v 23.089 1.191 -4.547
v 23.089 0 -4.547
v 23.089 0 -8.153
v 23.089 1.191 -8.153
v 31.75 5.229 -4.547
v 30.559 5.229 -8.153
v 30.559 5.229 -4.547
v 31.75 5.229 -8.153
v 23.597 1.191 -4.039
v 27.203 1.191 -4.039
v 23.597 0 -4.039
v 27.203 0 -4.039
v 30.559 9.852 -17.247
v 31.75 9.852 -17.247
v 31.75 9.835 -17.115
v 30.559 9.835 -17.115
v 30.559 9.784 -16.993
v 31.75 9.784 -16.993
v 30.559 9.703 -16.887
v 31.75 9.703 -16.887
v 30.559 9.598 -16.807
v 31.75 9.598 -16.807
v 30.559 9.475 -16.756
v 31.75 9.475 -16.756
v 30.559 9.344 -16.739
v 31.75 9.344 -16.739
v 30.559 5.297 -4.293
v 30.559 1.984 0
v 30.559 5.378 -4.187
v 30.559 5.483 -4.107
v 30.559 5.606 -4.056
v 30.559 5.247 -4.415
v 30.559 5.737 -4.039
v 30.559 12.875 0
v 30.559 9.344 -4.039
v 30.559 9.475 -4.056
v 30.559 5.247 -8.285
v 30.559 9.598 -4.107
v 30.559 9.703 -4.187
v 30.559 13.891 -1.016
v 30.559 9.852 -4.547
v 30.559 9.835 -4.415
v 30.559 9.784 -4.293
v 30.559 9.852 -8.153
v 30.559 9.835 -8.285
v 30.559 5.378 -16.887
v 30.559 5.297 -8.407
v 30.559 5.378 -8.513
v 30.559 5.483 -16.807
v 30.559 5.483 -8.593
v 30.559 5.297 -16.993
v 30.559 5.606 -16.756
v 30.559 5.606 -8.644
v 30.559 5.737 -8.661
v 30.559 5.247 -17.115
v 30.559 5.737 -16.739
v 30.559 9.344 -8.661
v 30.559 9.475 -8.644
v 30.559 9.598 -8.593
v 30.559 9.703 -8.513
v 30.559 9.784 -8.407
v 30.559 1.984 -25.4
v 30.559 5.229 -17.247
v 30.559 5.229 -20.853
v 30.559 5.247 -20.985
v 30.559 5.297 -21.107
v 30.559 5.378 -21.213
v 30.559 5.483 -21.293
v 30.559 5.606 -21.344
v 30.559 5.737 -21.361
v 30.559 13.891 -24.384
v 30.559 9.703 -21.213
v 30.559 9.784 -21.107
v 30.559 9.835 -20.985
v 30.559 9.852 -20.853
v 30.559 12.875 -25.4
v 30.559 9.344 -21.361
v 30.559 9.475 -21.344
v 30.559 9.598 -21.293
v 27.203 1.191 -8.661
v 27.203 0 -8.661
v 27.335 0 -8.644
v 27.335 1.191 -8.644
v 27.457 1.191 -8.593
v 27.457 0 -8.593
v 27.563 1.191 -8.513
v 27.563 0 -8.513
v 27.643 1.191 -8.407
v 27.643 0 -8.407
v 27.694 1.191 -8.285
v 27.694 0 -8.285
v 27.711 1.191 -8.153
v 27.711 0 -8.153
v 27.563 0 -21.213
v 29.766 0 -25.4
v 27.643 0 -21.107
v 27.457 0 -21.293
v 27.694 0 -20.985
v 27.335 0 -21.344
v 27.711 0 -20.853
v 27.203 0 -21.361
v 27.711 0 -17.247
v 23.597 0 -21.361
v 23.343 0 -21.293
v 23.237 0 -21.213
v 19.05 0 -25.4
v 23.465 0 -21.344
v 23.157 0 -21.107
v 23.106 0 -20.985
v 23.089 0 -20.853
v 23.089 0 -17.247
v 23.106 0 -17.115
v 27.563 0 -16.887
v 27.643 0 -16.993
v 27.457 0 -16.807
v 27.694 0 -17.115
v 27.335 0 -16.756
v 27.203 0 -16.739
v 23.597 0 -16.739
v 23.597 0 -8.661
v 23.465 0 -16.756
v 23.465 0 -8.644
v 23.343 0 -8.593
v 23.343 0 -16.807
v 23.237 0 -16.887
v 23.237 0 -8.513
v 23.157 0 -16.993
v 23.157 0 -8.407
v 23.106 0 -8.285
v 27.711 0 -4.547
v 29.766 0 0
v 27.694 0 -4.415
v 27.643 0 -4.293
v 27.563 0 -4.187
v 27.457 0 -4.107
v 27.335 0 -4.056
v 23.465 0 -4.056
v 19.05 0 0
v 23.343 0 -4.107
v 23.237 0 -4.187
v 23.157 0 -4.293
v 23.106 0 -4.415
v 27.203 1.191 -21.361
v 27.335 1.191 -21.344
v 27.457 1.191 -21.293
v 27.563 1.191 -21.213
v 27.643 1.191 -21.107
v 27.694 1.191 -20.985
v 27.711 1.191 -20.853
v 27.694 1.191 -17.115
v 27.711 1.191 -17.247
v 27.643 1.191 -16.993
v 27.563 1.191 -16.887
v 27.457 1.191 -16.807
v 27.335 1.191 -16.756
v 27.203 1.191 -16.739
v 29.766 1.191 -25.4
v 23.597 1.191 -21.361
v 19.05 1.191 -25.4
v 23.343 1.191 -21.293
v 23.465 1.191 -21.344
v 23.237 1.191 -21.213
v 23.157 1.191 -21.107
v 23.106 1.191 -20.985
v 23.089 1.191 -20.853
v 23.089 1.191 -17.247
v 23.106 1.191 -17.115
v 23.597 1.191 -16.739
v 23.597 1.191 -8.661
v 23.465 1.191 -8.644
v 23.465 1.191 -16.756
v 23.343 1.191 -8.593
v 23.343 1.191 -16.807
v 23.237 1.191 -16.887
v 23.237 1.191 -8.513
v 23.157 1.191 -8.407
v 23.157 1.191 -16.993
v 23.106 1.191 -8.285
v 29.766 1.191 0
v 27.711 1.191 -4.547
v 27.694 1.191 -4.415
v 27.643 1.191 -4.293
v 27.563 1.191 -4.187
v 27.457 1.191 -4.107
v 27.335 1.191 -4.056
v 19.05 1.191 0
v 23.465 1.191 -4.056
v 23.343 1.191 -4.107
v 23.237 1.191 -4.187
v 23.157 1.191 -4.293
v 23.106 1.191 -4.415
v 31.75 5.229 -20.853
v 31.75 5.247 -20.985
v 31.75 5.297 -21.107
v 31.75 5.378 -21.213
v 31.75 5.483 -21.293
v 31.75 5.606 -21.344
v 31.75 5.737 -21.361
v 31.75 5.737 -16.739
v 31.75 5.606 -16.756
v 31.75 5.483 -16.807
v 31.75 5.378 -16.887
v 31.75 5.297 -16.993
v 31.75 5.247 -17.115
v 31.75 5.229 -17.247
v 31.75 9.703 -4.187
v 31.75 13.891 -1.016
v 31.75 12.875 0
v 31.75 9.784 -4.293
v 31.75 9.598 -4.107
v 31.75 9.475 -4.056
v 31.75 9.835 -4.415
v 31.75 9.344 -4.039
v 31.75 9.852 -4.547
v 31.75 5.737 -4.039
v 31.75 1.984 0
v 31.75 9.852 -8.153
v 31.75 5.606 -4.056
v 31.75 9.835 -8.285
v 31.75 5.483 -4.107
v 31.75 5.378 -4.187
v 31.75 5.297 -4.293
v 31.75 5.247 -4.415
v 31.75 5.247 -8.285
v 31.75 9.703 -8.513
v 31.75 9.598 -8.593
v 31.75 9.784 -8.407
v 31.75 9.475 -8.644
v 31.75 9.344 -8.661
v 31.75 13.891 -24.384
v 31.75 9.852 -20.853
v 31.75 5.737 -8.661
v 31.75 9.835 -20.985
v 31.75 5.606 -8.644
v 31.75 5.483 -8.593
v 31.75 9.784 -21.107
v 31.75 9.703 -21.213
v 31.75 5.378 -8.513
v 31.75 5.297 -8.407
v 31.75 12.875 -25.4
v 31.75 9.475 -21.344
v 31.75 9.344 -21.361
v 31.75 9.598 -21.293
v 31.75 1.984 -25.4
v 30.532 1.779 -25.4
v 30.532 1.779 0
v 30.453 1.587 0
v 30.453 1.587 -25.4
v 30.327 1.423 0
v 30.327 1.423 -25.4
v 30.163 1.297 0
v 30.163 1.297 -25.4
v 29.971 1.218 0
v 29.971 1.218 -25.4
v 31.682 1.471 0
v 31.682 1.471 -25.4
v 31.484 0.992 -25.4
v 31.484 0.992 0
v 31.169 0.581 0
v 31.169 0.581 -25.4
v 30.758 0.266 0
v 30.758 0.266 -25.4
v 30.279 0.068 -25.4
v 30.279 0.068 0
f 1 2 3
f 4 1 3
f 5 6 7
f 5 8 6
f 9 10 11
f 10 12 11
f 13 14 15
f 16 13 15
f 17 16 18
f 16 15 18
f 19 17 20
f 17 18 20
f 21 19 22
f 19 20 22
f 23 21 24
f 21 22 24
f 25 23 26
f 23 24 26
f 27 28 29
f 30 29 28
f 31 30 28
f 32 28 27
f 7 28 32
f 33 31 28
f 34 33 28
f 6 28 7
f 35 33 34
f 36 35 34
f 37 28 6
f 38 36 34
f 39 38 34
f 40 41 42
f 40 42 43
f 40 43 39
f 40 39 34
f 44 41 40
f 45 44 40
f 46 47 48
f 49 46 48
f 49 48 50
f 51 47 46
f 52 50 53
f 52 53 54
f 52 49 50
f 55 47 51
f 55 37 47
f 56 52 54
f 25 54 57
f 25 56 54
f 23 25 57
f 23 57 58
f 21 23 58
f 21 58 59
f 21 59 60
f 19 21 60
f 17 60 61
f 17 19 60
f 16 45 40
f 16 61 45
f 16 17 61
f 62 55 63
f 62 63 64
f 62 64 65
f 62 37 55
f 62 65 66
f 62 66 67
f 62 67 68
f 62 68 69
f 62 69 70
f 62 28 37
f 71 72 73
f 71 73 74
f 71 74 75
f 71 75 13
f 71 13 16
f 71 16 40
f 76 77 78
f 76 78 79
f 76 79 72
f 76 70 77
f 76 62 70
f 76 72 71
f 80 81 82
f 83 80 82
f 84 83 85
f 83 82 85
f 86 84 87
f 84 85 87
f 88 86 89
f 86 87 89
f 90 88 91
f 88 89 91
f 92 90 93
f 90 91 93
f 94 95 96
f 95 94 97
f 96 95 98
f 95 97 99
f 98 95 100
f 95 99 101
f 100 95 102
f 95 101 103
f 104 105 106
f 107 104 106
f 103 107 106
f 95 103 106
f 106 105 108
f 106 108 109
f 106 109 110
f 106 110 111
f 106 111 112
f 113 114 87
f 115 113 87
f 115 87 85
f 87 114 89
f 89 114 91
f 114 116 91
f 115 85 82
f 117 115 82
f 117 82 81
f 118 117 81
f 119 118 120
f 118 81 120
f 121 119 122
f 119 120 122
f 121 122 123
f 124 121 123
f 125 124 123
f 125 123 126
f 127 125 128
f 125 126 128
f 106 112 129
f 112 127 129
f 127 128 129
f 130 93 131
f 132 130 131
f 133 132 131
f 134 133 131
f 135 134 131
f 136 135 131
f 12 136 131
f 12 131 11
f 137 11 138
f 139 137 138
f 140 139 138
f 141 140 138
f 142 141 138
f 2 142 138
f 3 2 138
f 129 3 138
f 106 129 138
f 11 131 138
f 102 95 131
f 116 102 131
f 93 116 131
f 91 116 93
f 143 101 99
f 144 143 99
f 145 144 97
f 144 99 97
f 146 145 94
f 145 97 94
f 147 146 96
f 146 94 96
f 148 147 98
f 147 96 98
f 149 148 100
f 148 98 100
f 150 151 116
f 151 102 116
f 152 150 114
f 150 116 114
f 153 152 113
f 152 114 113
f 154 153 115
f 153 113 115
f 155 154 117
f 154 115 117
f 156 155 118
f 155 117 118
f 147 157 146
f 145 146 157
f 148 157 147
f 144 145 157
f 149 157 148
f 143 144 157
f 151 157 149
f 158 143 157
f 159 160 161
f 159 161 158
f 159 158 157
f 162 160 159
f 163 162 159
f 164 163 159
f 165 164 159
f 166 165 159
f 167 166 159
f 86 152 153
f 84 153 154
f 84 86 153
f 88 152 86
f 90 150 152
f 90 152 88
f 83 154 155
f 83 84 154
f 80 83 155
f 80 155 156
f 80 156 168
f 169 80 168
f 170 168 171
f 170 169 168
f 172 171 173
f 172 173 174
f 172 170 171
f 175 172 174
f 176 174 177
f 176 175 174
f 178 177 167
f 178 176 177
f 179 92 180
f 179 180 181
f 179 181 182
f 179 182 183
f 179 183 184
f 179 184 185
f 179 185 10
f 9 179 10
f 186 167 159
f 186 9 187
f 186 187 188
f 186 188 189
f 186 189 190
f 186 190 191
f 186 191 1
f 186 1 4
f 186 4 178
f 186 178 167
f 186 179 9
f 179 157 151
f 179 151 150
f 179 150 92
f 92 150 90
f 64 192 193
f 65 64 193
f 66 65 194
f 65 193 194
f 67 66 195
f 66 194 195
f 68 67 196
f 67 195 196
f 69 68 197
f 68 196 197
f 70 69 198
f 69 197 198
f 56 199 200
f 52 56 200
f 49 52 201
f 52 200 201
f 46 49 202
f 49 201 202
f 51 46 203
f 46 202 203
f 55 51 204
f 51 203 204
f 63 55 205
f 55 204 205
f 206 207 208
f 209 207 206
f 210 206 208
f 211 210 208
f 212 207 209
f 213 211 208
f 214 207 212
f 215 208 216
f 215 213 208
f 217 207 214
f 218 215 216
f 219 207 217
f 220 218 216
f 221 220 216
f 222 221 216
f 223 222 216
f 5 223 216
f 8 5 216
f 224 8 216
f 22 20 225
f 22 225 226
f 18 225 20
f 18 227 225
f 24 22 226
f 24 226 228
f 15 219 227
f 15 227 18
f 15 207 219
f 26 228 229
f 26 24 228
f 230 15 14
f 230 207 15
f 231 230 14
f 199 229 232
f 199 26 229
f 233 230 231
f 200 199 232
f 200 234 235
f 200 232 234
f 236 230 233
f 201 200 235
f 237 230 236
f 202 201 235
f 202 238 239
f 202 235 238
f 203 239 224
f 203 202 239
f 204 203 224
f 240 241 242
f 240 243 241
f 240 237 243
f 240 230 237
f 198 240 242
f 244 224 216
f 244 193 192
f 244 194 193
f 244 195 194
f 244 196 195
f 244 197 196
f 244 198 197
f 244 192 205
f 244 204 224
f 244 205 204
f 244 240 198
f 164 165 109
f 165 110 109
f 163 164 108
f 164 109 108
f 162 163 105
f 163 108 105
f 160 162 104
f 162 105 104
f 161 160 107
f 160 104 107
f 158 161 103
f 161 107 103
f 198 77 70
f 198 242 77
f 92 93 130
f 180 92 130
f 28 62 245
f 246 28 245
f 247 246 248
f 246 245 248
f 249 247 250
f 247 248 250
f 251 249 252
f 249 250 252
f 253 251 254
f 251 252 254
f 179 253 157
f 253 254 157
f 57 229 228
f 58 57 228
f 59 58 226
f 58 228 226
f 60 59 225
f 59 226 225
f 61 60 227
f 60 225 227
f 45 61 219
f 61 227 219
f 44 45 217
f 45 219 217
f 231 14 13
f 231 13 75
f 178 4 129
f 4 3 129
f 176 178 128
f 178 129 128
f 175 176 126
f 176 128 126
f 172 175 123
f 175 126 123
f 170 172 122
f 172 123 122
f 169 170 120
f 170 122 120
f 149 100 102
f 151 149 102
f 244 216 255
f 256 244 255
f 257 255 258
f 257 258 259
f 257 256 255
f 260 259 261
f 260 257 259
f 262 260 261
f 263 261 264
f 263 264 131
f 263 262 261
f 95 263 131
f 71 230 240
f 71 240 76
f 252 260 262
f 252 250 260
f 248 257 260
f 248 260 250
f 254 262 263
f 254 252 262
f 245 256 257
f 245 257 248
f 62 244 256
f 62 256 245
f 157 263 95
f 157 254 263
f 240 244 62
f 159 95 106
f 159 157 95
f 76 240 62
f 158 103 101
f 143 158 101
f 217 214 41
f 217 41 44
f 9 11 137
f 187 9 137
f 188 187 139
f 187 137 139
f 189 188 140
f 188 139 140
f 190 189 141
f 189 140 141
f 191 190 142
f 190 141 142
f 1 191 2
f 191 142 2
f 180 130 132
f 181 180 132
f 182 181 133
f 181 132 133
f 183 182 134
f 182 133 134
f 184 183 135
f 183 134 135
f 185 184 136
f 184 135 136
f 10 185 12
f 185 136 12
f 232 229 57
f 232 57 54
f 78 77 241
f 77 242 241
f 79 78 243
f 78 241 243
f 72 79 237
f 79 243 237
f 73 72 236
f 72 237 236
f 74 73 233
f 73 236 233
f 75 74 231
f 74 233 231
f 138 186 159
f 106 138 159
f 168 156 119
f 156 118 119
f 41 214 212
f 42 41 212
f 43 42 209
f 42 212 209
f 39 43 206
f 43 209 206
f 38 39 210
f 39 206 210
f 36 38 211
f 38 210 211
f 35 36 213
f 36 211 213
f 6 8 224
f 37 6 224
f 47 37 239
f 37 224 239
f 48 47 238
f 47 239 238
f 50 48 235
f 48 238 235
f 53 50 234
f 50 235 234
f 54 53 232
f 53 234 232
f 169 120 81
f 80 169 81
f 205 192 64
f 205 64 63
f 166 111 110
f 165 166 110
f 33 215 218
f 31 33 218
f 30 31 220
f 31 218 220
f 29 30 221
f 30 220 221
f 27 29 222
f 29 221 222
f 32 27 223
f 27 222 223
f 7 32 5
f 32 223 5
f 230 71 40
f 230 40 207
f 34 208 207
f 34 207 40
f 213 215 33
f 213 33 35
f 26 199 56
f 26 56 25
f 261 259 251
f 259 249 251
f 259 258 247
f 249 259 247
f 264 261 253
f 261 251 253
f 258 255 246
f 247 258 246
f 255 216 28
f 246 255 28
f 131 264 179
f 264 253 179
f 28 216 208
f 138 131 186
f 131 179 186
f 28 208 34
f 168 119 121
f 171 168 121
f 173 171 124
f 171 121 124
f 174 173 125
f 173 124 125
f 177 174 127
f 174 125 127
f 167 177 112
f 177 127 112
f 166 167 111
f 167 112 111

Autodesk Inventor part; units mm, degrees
ref_plane "YZ Plane" through (0, 0, 0) normal (1, 0, 0) x (0, 1, 0)
ref_plane "XZ Plane" through (0, 0, 0) normal (0, 1, 0) x (-1, 0, 0)
sketch "Sketch1" plane through (0, 0, 0) normal (0, 1, 0) x (-1, 0, 0)
  line L0 (-31.75, 0) -> (31.75, 0)
  line L1 (31.75, 0) -> (31.75, -25.4)
  line L2 (31.75, -25.4) -> (-31.75, -25.4)
  line L3 (-31.75, -25.4) -> (-31.75, 0)
  line L4 (31.75, 0) -> (-31.75, -25.4) construction
  point P0 (0, 0)
  point P1 (0, 0)
  dimension "d0" = 63.5
  dimension "d1" = 25.4
extrude "Plate1" add sketch "Sketch1" along normal blind 1.1906
sketch "Sketch2" plane through (30.5594, 0, -25.4) normal (1, 0, 0) x (0, 1, 0)
  line L0 (0, 25.4) -> (0, 0)
  line L1 (0, 0) -> (13.8906, 0)
  line L2 (13.8906, 0) -> (13.8906, 25.4)
  line L3 (13.8906, 25.4) -> (0, 25.4)
edge flange "Flanges" height 12.7 angle 90 thickness 1.1906 bend radius 0.7937 thickness toward (1, 0, 0) relief tear relief width 1.1906 relief depth 0.5953 corner gap 1.1906 corner form 0 edges at (31.75, 1.1906, -12.7) (-31.75, 1.1906, -12.7) wall of the first edge with corners at (30.5594, 0, 0) (30.5594, 0, -25.4) (30.5594, 13.8906, -25.4) (30.5594, 13.8906, 0)
bend "Bend1"
corner "Corner1"
sketch "Sketch3" plane through (31.75, 1.9844, -25.4) normal (1, 0, 0) x (0, 0, -1)
  line L0 (-20.8534, 7.8676) -> (-17.2466, 7.8676)
  line L1 (-16.7386, 7.3596) -> (-16.7386, 3.7528)
  line L2 (-17.2466, 3.2448) -> (-20.8534, 3.2448)
  line L3 (-21.3614, 3.7528) -> (-21.3614, 7.3596)
  arc A0 (-20.8534, 7.8676) -> (-21.3614, 7.3596) centre (-20.8534, 7.3596) ccw
  arc A1 (-16.7386, 7.3596) -> (-17.2466, 7.8676) centre (-17.2466, 7.3596) ccw
  arc A2 (-17.2466, 3.2448) -> (-16.7386, 3.7528) centre (-17.2466, 3.7528) ccw
  arc A3 (-21.3614, 3.7528) -> (-20.8534, 3.2448) centre (-20.8534, 3.7528) ccw
  line L4 (-25.4, 0) -> (-25.4, 11.9062) construction
  line L5 (-25.4, 11.9062) -> (0, 11.9063) construction
  line L6 (-20.8534, 7.3596) -> (-17.2466, 3.7528) construction
  point P0 (-25.4, -1.9844)
  point P1 (-16.7386, 3.2448)
  point P2 (-21.3614, 3.2448)
  point P3 (-19.05, 5.5562)
  dimension "d16" = 4.6228
  dimension "d17" = 0.508
  dimension "d20" = 6.35
  dimension "d21" = 6.35
extrude "Flange Stamp" cut sketch "Sketch3" against normal blind 1.1906
sketch "Sketch7" plane through (31.75, 1.9844, 0) normal (1, 0, 0) x (0, 0, -1)
  arc A0 (4.5466, 7.8676) -> (4.0386, 7.3596) centre (4.5466, 7.3596) ccw construction
  arc A1 (8.1534, 3.2448) -> (8.6614, 3.7528) centre (8.1534, 3.7528) ccw construction
  circle A2 centre (6.35, 5.5563) radius 2.1844
  line L0 (4.5466, 7.3596) -> (8.1534, 3.7528) construction
  point P0 (0, -1.9844)
  dimension "d46" = 4.3688
surface extrude "Flange Circle" sketch "Sketch7" against normal up to surface (1.1906 mm away) shown yes curves A2
ref_plane "Flange Pattern Plane" through (31.75, 7.5406, -4.5466) normal (0, 1, 0) x (1, 0, 0)
sketch "Flange Pattern Sketch" plane through (31.75, 7.5406, -4.5466) normal (0, 1, 0) x (1, 0, 0)
  line L0 (0, 3.6068) -> (0, 0) construction
  line L1 (-76.2822, -4.5466) -> (13.1932, -4.5466) construction
  line L2 (0, 0) -> (-1.1906, 0) construction
  point P0 (-31.75, -4.5466)
  point P1 (0, 1.8034)
  point P2 (0, 14.5034)
  dimension "d131" = 12.7
  dimension "d134" = 12.7
pattern_sketch "Flange Pattern" of "Flange Circle", "Flange Stamp" from (31.75, 7.5406, -6.35) copies at (31.75, 7.5406, -19.05)
sketch "Sketch8" plane through (0, 0, 0) normal (0, -1, 0) x (1, 0, 0)
  line L0 (29.7656, 0) -> (-29.7656, 0) construction
  line L1 (27.2034, -4.0386) -> (23.5966, -4.0386)
  line L2 (23.0886, -4.5466) -> (23.0886, -8.1534)
  line L3 (23.5966, -8.6614) -> (27.2034, -8.6614)
  line L4 (27.7114, -8.1534) -> (27.7114, -4.5466)
  arc A0 (27.7114, -4.5466) -> (27.2034, -4.0386) centre (27.2034, -4.5466) ccw
  arc A1 (27.2034, -8.6614) -> (27.7114, -8.1534) centre (27.2034, -8.1534) ccw
  arc A2 (23.0886, -8.1534) -> (23.5966, -8.6614) centre (23.5966, -8.1534) ccw
  arc A3 (23.5966, -4.0386) -> (23.0886, -4.5466) centre (23.5966, -4.5466) ccw
  line L5 (27.2034, -4.5466) -> (23.5966, -8.1534) construction
  line L6 (31.75, 0) -> (31.75, -25.4) construction
  point P0 (0, 0)
  point P1 (23.0886, -8.6614)
  point P2 (27.7114, -8.6614)
  point P3 (25.4, -6.35)
  dimension "d49" = 4.6228
  dimension "d50" = 0.508
  dimension "d51" = 6.35
  dimension "d52" = 6.35
extrude "Body Stamp" cut sketch "Sketch8" against normal blind 1.1906
sketch "Sketch9" plane through (0, 0, 0) normal (0, -1, 0) x (1, 0, 0)
  arc A0 (27.7114, -4.5466) -> (27.2034, -4.0386) centre (27.2034, -4.5466) ccw construction
  arc A1 (23.0886, -8.1534) -> (23.5966, -8.6614) centre (23.5966, -8.1534) ccw construction
  line L0 (27.2034, -4.5466) -> (23.5966, -8.1534) construction
  circle A2 centre (25.4, -6.35) radius 2.1844
  point P0 (0, 0)
  dimension "d55" = 4.3688
surface extrude "Body Circle" sketch "Sketch9" against normal up to surface (1.1906 mm away) shown yes curves A2
sketch "Body Pattern Sketch" plane through (0, 0, 0) normal (0, -1, 0) x (1, 0, 0)
  line L0 (29.7656, 0) -> (-29.7656, 0) construction
  line L1 (31.75, 0) -> (31.75, -25.4) construction
  circle A0 centre (25.4, -6.35) radius 2.1844 construction
  point P0 (0, 0)
  point P1 (25.4, -19.05)
  dimension "d62" = 12.7
  dimension "d65" = 12.7
  dimension "d139" = 12.7
pattern_sketch "Body Pattern" of "Body Stamp", "Body Circle" from (25.4, 0, -6.35) copies at (25.4, 0, -19.05)
sketch "Arc Length" plane through (30.5594, 1.9844, 0) normal (0, 0, 1) x (1, 0, 0)
  line L0 (0, 0) -> (1.1906, 0) construction
  arc A0 (-0.7938, -0.7938) -> (0, 0) centre (-0.7938, 0) ccw construction
  line L1 (-0.7938, -1.9844) -> (-0.7938, -0.7938) construction
  arc A1 (-0.7938, -1.9844) -> (1.1906, 0) centre (-0.7938, 0) ccw construction
  point P0 (-30.5594, -1.9844)
  dimension "d85" = 3.117
  dimension "d92" = 1.2468
sketch "Sketch13" plane through (31.75, 13.8906, 0) normal (1, 0, 0) x (0, 0, -1)
  line L0 (0, 0) -> (25.4, 0) construction
  line L1 (62.4078, 0) -> (63.4238, -1.016)
  line L2 (63.4238, -1.016) -> (64.4398, 0)
  line L3 (62.4078, 0) -> (64.4398, 0)
  line L4 (25.4, -11.9063) -> (0, -11.9063) construction
  line L5 (63.4238, -10.8903) -> (61.3168, -12.9972)
  line L6 (61.3168, -12.9972) -> (63.4238, -15.1042)
  line L7 (63.4238, -15.1042) -> (65.5308, -12.9972)
  line L8 (65.5308, -12.9972) -> (63.4238, -10.8903)
  line L9 (63.4238, -10.8903) -> (63.4238, -15.1042) construction
  line L10 (63.4238, -1.016) -> (63.4238, -10.8903) construction
  line L11 (0, -11.9063) -> (25.4, -11.9063) construction
  point P0 (0, -13.8906)
  dimension "d86" = 4.2139
  dimension "d88" = 1.016
  dimension "d91" = 1.016
  dimension "d102" = 63.4238
feature "Notch" [suppressed]
mirror "Notch Mirror" [suppressed]
pattern_linear "Notch Pattern" [suppressed]
chamfer "End Chamfer" distance 1.016 angle 45 4 edges at (-31.1547, 13.8906, -25.4) (31.1547, 13.8906, -25.4) (-31.1547, 13.8906, 0) (31.1547, 13.8906, 0)
sketch "Sketch14" plane through (-31.75, 1.9844, 419.1) normal (1, 0, 0) x (0, 0, -1)
  line L0 (419.1, 11.9063) -> (444.5, 11.9063) construction
  line L1 (419.1, 0) -> (419.1, 11.9063) construction
  line L2 (419.1, -1.9844) -> (444.5, -1.9844) construction
  line L3 (419.1, 11.9063) -> (444.5, 11.9063)
  line L4 (444.5, 11.9063) -> (444.5, -1.9844)
  line L5 (444.5, -1.9844) -> (419.1, -1.9844)
  line L6 (419.1, -1.9844) -> (419.1, 11.9063)
  point P0 (382.0521, -1.9844)
extrude "Half Cut" cut sketch "Sketch14" along normal blind 50.8
equation "\"d1\" = 12.7 * Length"
equation "\"d18\" = Thickness"
equation "\"d53\" = Thickness"
equation "\"d89\" = Thickness"
equation "\"d2\" = Thickness"
equation "\"d3\" = BendReliefWidth"
equation "\"d4\" = BendReliefDepth"
equation "\"d5\" = MinimumRemnant"
equation "\"d6\" = TransitionRadius"
equation "\"d10\" = CornerReliefSize"
equation "\"d11\" = GapSize"
equation "\"d12\" = JacobiRadiusSize"
equation "\"BendRadius\" = Thickness"
equation "\"BendReliefWidth\" = Thickness"
equation "\"BendReliefDepth\" = 0.5 * Thickness"
equation "\"CornerReliefSize\" = 4 * Thickness"
equation "\"MinimumRemnant\" = 2 * Thickness"
equation "\"TransitionRadius\" = BendRadius"
equation "\"JacobiRadiusSize\" = BendRadius"
equation "\"GapSize\" = Thickness"
equation "\"Length\" = 2"
equation "\"Thickness\" = 1.190625"
properties part number "Alu C 1x3x1x35"
